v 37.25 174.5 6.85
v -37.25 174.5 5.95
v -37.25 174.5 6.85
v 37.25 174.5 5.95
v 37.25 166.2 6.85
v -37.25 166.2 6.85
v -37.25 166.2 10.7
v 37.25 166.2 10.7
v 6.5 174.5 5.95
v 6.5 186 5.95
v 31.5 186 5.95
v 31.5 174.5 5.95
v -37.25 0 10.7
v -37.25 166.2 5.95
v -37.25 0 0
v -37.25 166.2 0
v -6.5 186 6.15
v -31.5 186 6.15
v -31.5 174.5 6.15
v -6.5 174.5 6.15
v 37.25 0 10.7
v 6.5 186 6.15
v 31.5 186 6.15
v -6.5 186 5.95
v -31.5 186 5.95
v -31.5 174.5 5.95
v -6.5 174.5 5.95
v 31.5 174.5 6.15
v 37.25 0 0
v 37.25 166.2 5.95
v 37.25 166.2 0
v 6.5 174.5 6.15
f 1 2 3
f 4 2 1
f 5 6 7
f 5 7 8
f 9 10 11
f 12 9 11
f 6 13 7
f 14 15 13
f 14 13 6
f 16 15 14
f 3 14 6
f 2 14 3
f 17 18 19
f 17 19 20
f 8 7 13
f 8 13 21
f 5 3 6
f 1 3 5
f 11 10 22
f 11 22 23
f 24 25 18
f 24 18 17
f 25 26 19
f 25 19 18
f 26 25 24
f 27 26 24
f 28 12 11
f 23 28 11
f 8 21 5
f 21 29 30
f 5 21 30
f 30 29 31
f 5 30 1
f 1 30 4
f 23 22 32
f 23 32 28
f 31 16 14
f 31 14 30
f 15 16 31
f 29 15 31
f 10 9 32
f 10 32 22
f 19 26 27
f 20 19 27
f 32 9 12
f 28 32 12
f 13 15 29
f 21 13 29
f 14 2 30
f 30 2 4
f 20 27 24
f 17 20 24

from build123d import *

# Parameters (mm, degrees)
SKETCH1_W           = 74.5
SKETCH1_H           = 166.2
BOSS_EXTRUDE1_DEPTH = 10.7
SKETCH2_W           = 74.5
SKETCH2_H           = 8.3
BOSS_EXTRUDE2_DEPTH = 0.9
SKETCH3_W           = 25
SKETCH3_H           = 11.5
BOSS_EXTRUDE3_DEPTH = 0.2
SKETCH3_3_W         = 25
SKETCH3_3_H         = 11.5
BOSS_EXTRUDE4_DEPTH = 0.2


with BuildPart() as part:
    # Sketch1 → Boss-Extrude1 (new body)
    with BuildSketch(Plane.XY):
        with Locations((0, 83.1)):
            Rectangle(SKETCH1_W, SKETCH1_H)
    extrude(amount=BOSS_EXTRUDE1_DEPTH)

    # Sketch2 → Boss-Extrude2 (add)
    with BuildSketch(Plane.XY.offset(5.95)):
        with Locations((0, 170.35)):
            Rectangle(SKETCH2_W, SKETCH2_H)
    extrude(amount=BOSS_EXTRUDE2_DEPTH)


with BuildPart() as body_2:
    # Sketch3 → Boss-Extrude3 (new body)
    with BuildSketch(Plane.XY.offset(5.95)):
        with Locations((-19, 180.25)):
            Rectangle(SKETCH3_W, SKETCH3_H)
    extrude(amount=BOSS_EXTRUDE3_DEPTH)


with BuildPart() as body_3:
    # Sketch3<3> → Boss-Extrude4 (new body)
    with BuildSketch(Plane.XY.offset(5.95)):
        with Locations((19, 180.25)):
            Rectangle(SKETCH3_3_W, SKETCH3_3_H)
    extrude(amount=BOSS_EXTRUDE4_DEPTH)


solid = Compound([part.part, body_2.part, body_3.part])
